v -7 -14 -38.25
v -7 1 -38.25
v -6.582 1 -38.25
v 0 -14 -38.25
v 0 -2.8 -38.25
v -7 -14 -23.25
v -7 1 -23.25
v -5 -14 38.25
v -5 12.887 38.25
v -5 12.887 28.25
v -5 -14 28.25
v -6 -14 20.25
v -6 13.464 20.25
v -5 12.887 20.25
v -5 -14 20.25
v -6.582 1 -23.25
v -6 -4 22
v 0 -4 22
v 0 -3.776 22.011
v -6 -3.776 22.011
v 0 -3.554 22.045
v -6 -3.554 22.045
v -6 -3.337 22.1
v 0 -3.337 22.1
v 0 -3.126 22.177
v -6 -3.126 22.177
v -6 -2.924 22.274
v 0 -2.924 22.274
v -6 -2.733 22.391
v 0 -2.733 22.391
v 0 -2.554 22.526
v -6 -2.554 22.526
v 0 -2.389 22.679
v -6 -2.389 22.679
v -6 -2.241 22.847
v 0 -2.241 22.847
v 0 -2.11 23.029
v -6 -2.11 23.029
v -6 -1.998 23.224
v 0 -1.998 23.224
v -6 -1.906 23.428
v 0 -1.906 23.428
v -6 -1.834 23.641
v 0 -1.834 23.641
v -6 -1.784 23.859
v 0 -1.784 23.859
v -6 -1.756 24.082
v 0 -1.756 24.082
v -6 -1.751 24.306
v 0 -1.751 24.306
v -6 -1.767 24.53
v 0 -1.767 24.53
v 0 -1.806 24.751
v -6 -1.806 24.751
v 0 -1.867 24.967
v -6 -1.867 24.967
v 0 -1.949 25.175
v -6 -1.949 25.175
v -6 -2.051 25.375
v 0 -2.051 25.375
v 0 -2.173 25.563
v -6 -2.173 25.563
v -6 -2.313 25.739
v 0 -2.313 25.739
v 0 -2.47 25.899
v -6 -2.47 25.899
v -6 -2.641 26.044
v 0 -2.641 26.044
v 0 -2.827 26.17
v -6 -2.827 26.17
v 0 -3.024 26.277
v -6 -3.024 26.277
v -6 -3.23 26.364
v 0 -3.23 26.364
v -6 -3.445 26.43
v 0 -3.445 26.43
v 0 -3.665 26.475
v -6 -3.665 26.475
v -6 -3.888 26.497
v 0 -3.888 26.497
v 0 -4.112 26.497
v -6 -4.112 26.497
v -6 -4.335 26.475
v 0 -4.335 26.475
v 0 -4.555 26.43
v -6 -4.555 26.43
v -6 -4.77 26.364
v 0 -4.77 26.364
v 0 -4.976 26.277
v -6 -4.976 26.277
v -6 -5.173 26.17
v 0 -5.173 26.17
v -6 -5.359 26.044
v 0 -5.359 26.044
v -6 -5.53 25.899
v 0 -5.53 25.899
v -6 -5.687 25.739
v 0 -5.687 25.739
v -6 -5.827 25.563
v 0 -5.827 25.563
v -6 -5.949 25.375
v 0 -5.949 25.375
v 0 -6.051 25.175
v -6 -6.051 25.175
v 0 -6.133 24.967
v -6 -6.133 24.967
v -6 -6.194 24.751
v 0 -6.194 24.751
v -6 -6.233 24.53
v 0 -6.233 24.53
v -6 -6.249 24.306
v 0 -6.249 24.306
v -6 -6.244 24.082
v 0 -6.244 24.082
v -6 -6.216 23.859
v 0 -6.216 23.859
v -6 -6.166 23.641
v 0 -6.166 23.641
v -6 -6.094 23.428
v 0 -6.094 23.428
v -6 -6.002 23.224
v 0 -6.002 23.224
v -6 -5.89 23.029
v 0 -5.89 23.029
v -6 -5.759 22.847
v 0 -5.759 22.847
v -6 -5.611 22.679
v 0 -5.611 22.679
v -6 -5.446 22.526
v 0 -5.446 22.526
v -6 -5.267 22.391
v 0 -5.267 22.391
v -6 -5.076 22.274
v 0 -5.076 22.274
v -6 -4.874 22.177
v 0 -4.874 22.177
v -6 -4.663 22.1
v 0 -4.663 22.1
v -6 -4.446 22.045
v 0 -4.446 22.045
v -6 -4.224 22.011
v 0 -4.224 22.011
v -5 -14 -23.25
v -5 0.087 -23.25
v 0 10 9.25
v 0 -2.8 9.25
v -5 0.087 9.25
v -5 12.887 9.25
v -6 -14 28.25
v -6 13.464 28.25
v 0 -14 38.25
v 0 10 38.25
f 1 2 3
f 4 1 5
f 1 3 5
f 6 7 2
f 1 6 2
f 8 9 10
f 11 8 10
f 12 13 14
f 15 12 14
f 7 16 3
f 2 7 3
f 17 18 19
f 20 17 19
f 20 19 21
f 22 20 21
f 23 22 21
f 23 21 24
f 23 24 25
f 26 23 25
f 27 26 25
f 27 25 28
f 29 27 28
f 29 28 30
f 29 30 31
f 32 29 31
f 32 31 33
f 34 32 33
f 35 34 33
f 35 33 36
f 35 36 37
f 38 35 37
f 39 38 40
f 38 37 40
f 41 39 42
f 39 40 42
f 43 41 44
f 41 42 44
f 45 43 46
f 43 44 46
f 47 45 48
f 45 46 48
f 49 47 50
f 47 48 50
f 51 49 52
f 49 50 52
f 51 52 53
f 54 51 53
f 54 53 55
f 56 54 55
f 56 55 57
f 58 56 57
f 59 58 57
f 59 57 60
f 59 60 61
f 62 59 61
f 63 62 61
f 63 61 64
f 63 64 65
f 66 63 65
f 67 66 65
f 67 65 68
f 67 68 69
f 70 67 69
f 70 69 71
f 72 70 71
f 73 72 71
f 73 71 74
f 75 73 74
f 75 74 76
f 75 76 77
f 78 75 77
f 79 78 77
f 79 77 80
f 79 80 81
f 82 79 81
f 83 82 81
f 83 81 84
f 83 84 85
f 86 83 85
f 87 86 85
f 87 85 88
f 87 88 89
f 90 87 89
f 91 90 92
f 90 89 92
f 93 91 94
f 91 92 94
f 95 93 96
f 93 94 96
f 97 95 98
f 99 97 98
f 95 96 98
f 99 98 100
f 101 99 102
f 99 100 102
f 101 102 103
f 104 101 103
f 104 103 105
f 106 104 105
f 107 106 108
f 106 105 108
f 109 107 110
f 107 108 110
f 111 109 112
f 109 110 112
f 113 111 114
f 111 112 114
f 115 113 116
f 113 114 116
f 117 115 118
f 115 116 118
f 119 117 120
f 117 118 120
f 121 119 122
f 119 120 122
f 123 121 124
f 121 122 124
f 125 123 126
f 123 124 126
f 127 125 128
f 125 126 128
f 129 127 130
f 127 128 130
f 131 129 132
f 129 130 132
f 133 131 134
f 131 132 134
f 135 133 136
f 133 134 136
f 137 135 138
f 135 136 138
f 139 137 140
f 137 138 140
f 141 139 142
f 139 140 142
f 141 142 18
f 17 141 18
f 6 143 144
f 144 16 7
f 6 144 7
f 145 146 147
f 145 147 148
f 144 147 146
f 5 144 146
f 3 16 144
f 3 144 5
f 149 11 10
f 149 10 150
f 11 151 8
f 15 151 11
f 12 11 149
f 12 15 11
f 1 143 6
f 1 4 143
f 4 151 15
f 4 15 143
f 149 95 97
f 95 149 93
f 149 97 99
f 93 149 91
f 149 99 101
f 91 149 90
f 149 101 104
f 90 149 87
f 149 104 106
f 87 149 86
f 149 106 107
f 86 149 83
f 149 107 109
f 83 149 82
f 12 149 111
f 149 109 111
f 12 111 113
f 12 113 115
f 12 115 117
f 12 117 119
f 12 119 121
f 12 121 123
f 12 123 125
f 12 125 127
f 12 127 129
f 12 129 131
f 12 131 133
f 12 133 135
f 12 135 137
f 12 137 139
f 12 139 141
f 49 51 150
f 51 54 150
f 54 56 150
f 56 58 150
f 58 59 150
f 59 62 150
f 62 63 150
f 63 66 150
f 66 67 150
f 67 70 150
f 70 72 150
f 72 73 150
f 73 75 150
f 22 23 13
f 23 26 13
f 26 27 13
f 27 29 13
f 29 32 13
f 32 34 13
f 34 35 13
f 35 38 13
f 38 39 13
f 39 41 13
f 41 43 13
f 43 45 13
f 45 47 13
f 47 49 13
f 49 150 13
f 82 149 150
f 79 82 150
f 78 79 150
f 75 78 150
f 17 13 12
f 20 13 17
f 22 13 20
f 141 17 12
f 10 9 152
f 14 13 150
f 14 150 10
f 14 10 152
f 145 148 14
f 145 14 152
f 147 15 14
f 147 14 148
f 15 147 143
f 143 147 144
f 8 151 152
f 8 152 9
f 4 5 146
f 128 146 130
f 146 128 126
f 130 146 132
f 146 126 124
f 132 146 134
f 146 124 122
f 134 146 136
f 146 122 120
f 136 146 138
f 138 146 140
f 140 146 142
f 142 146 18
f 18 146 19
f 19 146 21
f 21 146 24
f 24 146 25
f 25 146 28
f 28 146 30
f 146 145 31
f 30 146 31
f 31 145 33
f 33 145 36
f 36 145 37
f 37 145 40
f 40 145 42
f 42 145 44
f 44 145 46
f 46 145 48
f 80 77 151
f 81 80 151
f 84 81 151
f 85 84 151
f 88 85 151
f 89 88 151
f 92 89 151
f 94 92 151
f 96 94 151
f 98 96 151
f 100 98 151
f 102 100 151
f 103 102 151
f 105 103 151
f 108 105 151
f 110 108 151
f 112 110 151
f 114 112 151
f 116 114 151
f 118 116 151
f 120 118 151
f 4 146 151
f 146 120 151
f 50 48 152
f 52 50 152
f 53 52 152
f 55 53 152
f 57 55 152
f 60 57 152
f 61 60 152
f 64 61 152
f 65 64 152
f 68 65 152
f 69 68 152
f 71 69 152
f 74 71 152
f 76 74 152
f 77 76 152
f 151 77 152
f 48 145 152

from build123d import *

# Parameters (mm, degrees)
BOSS_EXTRUDE1_DEPTH = 14
SKETCH2_R           = 2.25
CUT_EXTRUDE1_DEPTH  = 42.328712779
SKETCH4_W           = 47.5
SKETCH4_H           = 13
CUT_EXTRUDE3_DEPTH  = 42.328712779
CHAMFER1_SIZE       = 6.92820323
CHAMFER1_SIZE_2     = 4
CHAMFER2_SIZE       = 3.8
CHAMFER2_SIZE2      = 6.581793069


with BuildPart() as part:
    # Sketch1 → Boss-Extrude1 (new, symmetric)
    with BuildSketch(Plane(origin=(0, 0, 0), x_dir=(1, 0, 0), z_dir=(0, 1, 0))):
        Polygon((-5, -20.25), (-5, 23.25), (-7, 23.25), (-7, 38.25), (0, 38.25), (0, -38.25), (-5, -38.25), (-5, -28.25), (-6, -28.25), (-6, -20.25), align=None)
    extrude(amount=BOSS_EXTRUDE1_DEPTH, both=True)

    # Sketch2 → Cut-Extrude1 (cut, through all)
    with BuildSketch(Plane(origin=(0, 0, 0), x_dir=(0, 0, -1), z_dir=(1, 0, 0))):
        with Locations((-24.25, -4)):
            Circle(SKETCH2_R)
    extrude(amount=-CUT_EXTRUDE1_DEPTH, mode=Mode.SUBTRACT)

    # Sketch4 → Cut-Extrude3 (cut, through all)
    with BuildSketch(Plane(origin=(0, 0, 0), x_dir=(0, 0, -1), z_dir=(1, 0, 0))):
        with Locations((14.5, 7.5)):
            Rectangle(SKETCH4_W, SKETCH4_H)
    extrude(amount=-CUT_EXTRUDE3_DEPTH, mode=Mode.SUBTRACT)

    # Chamfer1
    # the kernel refuses this chamfer: 6.92820323, 4 mm, written as the material it takes off along each edge
    with BuildSketch(Plane(origin=(0, 14, -8.673855882), x_dir=(-0.9998132206222079, 0.01932676561270069, 0), z_dir=(0, 0, 1))) as chamfer1_piece_1:
        Polygon((CHAMFER1_SIZE * 0.999813220662, CHAMFER1_SIZE * 0.0193267656135), (-CHAMFER1_SIZE_2 * 0.0193267656127, CHAMFER1_SIZE_2 * 0.999813220622), (0, 0), align=None)
    extrude(amount=64.847711765, mode=Mode.SUBTRACT)

    # Chamfer2
    chamfer2_edges = [part.edges().sort_by_distance(p)[0] for p in [
        (0, 1, -14.5),
    ]]
    chamfer2_side = [part.faces().sort_by_distance(p)[0] for p in [
        (0, -4.279514007, 4.174270011),
    ]]
    chamfer(chamfer2_edges, length=CHAMFER2_SIZE, length2=CHAMFER2_SIZE2, reference=chamfer2_side[0])


solid = part.part
